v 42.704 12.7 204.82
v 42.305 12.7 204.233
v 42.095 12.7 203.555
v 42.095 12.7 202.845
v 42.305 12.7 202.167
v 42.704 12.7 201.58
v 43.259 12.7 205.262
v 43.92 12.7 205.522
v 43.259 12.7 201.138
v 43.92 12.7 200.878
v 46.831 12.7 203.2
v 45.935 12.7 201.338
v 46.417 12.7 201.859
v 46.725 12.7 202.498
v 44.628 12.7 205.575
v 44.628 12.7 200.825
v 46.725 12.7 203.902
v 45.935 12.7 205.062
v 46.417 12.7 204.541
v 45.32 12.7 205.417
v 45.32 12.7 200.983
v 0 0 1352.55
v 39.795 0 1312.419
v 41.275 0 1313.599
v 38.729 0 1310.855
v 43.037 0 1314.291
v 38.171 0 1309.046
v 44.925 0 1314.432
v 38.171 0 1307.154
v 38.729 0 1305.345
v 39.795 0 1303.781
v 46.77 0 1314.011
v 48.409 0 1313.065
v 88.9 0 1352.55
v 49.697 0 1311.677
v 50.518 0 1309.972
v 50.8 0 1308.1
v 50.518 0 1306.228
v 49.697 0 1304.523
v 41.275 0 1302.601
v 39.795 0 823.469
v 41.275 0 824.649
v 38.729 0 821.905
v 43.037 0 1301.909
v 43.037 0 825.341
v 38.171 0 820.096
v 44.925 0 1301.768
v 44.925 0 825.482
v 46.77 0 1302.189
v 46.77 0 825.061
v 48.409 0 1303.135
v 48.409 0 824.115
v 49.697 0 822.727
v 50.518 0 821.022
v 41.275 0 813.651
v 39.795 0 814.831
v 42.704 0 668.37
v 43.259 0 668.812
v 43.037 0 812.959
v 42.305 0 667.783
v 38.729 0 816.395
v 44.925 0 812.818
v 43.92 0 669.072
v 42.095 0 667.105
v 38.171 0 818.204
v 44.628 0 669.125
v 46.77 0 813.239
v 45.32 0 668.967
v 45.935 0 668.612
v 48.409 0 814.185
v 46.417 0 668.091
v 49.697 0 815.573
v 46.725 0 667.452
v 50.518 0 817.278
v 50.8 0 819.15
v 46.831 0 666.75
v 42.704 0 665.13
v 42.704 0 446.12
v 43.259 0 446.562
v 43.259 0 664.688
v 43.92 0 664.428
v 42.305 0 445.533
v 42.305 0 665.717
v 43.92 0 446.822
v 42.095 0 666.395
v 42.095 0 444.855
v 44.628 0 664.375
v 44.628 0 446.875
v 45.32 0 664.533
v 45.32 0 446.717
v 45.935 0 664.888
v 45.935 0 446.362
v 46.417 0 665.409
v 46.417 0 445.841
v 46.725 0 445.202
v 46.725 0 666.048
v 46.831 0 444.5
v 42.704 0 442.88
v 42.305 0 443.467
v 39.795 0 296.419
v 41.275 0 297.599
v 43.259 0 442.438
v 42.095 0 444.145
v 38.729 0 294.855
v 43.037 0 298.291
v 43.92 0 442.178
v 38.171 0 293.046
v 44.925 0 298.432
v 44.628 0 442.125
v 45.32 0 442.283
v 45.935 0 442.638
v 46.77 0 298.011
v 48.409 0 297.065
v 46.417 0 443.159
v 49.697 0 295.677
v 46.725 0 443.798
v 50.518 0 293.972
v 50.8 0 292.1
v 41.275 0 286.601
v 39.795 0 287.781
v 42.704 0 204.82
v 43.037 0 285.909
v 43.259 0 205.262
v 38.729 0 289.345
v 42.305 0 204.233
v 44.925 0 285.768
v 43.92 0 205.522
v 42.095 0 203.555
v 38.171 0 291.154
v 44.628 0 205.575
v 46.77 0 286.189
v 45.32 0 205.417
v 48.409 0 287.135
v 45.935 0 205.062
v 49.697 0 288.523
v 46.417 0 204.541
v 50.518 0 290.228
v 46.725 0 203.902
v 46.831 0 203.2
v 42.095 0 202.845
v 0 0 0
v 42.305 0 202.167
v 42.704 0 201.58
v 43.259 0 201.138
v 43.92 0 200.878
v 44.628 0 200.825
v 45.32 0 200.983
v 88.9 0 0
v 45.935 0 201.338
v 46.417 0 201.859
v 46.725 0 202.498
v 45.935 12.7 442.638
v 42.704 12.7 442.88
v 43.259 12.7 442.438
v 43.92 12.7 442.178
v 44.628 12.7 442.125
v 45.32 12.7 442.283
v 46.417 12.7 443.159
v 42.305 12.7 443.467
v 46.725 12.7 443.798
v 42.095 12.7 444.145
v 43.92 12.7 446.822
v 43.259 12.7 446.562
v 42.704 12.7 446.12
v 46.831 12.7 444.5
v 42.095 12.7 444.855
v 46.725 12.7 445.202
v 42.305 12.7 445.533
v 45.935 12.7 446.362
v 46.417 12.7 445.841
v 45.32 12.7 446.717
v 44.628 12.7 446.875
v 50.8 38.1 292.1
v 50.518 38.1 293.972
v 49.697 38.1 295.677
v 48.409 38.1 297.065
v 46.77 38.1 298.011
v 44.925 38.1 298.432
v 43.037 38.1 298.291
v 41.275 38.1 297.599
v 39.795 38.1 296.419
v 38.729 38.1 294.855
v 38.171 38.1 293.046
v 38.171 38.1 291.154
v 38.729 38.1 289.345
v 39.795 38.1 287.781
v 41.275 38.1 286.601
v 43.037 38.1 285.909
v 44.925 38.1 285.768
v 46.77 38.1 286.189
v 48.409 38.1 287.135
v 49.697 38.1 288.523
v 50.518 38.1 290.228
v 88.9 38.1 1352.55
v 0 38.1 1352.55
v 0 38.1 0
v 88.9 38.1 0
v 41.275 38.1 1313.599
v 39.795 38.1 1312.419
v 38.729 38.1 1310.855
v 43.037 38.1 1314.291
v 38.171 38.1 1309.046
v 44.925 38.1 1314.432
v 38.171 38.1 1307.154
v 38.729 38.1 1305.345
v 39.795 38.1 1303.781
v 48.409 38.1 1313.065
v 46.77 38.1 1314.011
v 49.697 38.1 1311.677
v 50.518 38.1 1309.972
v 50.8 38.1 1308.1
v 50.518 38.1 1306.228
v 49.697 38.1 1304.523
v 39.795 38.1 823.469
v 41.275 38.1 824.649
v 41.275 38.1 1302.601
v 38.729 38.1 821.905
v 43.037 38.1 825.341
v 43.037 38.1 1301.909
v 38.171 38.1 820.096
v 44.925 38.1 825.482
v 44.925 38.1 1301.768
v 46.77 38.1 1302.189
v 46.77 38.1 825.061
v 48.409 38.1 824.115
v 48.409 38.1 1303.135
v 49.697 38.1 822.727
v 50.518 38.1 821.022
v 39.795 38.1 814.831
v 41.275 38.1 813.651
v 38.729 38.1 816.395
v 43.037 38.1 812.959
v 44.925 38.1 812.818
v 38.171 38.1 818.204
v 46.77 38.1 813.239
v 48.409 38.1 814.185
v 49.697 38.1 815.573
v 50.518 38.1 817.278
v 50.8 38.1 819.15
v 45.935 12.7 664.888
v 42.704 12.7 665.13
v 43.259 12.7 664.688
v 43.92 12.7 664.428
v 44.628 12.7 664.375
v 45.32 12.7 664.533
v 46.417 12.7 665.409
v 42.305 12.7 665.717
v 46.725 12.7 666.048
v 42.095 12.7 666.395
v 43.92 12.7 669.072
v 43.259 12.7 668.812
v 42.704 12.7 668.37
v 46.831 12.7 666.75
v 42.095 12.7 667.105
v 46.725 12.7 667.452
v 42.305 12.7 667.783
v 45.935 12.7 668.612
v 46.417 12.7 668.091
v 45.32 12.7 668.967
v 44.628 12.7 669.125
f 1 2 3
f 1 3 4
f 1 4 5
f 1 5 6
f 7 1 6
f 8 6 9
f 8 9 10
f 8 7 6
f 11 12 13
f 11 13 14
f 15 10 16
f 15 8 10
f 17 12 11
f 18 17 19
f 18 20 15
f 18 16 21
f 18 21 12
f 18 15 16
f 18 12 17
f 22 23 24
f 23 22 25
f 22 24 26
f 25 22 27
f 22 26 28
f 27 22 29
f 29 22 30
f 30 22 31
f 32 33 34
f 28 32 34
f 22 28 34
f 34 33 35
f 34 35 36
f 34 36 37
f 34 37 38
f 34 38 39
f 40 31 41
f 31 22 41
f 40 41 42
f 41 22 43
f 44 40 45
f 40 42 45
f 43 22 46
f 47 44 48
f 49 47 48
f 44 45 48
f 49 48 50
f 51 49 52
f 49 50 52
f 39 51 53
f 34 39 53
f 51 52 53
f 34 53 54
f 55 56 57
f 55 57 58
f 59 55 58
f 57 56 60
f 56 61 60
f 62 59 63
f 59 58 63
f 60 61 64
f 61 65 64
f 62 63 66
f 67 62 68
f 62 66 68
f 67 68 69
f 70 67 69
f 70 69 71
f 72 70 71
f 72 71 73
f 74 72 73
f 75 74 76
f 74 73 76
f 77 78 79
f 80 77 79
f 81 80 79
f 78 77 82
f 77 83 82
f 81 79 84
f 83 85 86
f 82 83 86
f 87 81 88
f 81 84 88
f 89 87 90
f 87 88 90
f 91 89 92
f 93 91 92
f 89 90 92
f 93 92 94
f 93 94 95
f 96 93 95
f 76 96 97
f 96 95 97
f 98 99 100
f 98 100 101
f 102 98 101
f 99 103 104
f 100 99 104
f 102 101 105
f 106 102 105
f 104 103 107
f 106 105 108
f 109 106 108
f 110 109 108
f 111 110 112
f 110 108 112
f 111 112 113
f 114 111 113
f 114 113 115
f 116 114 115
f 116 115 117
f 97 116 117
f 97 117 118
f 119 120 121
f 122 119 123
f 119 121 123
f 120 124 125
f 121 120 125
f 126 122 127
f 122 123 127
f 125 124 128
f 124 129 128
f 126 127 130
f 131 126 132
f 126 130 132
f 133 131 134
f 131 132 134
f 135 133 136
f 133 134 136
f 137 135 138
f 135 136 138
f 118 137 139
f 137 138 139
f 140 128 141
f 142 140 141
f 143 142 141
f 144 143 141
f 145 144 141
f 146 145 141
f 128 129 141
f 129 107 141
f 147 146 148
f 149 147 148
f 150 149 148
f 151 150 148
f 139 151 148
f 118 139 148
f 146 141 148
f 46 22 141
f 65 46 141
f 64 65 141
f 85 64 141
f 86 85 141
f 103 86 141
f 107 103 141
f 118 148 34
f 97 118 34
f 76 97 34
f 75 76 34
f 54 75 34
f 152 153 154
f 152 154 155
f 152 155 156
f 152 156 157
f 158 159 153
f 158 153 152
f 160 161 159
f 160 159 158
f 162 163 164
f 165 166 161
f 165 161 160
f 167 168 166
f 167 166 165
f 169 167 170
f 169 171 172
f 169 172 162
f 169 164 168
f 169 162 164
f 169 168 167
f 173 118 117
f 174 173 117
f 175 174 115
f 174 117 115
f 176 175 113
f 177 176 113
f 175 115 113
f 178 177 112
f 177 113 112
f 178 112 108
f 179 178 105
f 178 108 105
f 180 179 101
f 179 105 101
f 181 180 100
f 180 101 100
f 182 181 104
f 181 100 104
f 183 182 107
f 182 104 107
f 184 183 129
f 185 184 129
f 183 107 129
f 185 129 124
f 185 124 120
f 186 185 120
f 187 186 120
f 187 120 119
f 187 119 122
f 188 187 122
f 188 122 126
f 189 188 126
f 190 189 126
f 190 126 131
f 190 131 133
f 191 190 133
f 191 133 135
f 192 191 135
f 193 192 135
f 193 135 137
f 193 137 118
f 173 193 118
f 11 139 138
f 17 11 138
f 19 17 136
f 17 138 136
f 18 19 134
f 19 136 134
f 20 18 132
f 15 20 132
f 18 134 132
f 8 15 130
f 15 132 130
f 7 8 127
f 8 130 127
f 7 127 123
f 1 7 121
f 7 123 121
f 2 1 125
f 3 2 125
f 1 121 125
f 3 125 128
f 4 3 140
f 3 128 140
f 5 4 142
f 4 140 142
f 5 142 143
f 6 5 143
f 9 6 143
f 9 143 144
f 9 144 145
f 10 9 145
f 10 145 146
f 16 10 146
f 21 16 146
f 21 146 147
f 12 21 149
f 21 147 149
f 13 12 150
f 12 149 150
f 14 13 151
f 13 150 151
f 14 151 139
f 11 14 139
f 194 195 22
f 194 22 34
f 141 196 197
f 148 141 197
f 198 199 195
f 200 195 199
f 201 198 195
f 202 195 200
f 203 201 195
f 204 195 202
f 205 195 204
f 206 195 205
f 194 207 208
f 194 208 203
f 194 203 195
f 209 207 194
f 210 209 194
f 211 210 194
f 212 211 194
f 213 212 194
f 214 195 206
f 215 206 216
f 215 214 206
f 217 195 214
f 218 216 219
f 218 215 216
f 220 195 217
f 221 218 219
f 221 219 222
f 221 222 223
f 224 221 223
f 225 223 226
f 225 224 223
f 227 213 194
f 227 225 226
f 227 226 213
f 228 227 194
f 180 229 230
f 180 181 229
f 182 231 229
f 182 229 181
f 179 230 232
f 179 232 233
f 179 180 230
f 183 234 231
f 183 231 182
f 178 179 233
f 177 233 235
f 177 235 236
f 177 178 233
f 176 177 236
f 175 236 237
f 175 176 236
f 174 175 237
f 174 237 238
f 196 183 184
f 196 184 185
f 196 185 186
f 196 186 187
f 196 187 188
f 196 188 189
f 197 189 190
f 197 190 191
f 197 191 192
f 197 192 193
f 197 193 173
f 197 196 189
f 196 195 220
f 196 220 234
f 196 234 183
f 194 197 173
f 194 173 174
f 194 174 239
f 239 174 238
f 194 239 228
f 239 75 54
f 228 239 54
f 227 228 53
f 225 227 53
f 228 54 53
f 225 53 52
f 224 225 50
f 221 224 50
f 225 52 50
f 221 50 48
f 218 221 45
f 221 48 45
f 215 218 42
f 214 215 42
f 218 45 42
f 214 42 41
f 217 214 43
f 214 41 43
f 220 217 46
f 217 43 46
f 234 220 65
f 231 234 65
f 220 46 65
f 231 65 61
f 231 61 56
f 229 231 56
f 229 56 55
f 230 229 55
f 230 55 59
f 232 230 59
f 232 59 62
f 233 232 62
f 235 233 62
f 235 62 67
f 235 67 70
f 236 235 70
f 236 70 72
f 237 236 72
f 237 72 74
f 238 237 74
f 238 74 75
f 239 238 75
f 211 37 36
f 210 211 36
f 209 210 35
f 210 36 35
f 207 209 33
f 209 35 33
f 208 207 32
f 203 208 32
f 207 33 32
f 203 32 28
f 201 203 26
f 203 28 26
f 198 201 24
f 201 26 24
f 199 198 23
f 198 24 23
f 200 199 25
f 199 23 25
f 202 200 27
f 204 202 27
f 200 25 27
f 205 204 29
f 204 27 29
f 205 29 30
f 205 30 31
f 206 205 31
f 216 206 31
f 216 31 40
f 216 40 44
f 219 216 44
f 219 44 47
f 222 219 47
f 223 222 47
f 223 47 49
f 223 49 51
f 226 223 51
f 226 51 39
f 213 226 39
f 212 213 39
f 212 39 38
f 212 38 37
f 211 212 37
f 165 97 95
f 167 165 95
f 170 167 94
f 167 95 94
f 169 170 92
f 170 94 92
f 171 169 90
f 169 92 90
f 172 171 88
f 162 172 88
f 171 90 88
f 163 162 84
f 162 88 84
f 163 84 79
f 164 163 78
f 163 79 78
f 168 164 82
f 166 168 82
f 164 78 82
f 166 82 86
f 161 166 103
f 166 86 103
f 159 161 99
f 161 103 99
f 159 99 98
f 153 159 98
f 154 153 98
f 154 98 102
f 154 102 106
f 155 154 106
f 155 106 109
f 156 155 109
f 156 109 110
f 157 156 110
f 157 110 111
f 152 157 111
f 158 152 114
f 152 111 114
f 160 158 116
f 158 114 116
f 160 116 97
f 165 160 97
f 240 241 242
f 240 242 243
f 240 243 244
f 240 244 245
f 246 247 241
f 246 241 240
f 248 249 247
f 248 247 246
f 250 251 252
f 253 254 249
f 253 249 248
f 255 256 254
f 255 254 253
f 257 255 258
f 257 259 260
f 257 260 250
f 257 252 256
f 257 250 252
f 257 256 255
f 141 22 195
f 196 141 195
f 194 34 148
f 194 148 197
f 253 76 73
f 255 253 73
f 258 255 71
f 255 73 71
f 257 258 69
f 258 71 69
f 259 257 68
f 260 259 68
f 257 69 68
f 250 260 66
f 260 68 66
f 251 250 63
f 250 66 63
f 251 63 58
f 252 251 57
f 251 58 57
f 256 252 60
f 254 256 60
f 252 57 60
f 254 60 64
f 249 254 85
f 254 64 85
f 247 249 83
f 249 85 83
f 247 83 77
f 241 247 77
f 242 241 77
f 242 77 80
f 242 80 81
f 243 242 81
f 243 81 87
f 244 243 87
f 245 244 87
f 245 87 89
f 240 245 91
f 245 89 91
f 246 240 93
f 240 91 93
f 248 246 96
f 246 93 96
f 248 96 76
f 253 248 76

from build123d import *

# Parameters (mm, degrees)
SKETCH002_AS_DRAWN_R                 = 2.38125
EXTRUDE002_DEPTH                     = 12.7
EXTRUDE002_ONTO_SKETCH002_ROLL_ANGLE = 90
SKETCH001_AS_DRAWN_R                 = 6.35
EXTRUDE001_DEPTH                     = 50.8
EXTRUDE001_ONTO_SKETCH001_ROLL_ANGLE = 90
SKETCH_W                             = 88.9
SKETCH_H                             = 38.1
EXTRUDE_DEPTH                        = 1352.55


with BuildPart() as extrude002:
    # Sketch002 as drawn → Extrude002 (new)
    with BuildSketch(Plane.XY):
        with Locations((44.45, 203.2)):
            Circle(SKETCH002_AS_DRAWN_R)
        with Locations((44.45, 666.75)):
            Circle(SKETCH002_AS_DRAWN_R)
        with Locations((44.45, 444.5)):
            Circle(SKETCH002_AS_DRAWN_R)
    extrude(amount=-EXTRUDE002_DEPTH)


with BuildPart() as extrude002_1:
    # Extrude002 onto Sketch002 roll: moved
    add(extrude002.part.rotate(Axis((0, 0, 0), (1, 0, 0)), EXTRUDE002_ONTO_SKETCH002_ROLL_ANGLE))


with BuildPart() as extrude002_2:
    # Extrude002 onto Sketch002 placement: moved
    add(extrude002_1.part)


with BuildPart() as extrude001:
    # Sketch001 as drawn → Extrude001 (new)
    with BuildSketch(Plane.XY):
        with Locations((44.45, 292.1)):
            Circle(SKETCH001_AS_DRAWN_R)
        with Locations((44.45, 819.15)):
            Circle(SKETCH001_AS_DRAWN_R)
        with Locations((44.45, 1308.1)):
            Circle(SKETCH001_AS_DRAWN_R)
    extrude(amount=-EXTRUDE001_DEPTH)


with BuildPart() as extrude001_1:
    # Extrude001 onto Sketch001 roll: moved
    add(extrude001.part.rotate(Axis((0, 0, 0), (1, 0, 0)), EXTRUDE001_ONTO_SKETCH001_ROLL_ANGLE))


with BuildPart() as extrude001_2:
    # Extrude001 onto Sketch001 placement: moved
    add(extrude001_1.part)


with BuildPart() as cut001:
    # Sketch → Extrude (new body)
    with BuildSketch(Plane.XY):
        with Locations((44.45, 19.05)):
            Rectangle(SKETCH_W, SKETCH_H)
    extrude(amount=EXTRUDE_DEPTH)

    # Cut: cut Extrude001
    add(extrude001_2.part, mode=Mode.SUBTRACT)

    # Cut001: cut Extrude002
    add(extrude002_2.part, mode=Mode.SUBTRACT)


solid = cut001.part
